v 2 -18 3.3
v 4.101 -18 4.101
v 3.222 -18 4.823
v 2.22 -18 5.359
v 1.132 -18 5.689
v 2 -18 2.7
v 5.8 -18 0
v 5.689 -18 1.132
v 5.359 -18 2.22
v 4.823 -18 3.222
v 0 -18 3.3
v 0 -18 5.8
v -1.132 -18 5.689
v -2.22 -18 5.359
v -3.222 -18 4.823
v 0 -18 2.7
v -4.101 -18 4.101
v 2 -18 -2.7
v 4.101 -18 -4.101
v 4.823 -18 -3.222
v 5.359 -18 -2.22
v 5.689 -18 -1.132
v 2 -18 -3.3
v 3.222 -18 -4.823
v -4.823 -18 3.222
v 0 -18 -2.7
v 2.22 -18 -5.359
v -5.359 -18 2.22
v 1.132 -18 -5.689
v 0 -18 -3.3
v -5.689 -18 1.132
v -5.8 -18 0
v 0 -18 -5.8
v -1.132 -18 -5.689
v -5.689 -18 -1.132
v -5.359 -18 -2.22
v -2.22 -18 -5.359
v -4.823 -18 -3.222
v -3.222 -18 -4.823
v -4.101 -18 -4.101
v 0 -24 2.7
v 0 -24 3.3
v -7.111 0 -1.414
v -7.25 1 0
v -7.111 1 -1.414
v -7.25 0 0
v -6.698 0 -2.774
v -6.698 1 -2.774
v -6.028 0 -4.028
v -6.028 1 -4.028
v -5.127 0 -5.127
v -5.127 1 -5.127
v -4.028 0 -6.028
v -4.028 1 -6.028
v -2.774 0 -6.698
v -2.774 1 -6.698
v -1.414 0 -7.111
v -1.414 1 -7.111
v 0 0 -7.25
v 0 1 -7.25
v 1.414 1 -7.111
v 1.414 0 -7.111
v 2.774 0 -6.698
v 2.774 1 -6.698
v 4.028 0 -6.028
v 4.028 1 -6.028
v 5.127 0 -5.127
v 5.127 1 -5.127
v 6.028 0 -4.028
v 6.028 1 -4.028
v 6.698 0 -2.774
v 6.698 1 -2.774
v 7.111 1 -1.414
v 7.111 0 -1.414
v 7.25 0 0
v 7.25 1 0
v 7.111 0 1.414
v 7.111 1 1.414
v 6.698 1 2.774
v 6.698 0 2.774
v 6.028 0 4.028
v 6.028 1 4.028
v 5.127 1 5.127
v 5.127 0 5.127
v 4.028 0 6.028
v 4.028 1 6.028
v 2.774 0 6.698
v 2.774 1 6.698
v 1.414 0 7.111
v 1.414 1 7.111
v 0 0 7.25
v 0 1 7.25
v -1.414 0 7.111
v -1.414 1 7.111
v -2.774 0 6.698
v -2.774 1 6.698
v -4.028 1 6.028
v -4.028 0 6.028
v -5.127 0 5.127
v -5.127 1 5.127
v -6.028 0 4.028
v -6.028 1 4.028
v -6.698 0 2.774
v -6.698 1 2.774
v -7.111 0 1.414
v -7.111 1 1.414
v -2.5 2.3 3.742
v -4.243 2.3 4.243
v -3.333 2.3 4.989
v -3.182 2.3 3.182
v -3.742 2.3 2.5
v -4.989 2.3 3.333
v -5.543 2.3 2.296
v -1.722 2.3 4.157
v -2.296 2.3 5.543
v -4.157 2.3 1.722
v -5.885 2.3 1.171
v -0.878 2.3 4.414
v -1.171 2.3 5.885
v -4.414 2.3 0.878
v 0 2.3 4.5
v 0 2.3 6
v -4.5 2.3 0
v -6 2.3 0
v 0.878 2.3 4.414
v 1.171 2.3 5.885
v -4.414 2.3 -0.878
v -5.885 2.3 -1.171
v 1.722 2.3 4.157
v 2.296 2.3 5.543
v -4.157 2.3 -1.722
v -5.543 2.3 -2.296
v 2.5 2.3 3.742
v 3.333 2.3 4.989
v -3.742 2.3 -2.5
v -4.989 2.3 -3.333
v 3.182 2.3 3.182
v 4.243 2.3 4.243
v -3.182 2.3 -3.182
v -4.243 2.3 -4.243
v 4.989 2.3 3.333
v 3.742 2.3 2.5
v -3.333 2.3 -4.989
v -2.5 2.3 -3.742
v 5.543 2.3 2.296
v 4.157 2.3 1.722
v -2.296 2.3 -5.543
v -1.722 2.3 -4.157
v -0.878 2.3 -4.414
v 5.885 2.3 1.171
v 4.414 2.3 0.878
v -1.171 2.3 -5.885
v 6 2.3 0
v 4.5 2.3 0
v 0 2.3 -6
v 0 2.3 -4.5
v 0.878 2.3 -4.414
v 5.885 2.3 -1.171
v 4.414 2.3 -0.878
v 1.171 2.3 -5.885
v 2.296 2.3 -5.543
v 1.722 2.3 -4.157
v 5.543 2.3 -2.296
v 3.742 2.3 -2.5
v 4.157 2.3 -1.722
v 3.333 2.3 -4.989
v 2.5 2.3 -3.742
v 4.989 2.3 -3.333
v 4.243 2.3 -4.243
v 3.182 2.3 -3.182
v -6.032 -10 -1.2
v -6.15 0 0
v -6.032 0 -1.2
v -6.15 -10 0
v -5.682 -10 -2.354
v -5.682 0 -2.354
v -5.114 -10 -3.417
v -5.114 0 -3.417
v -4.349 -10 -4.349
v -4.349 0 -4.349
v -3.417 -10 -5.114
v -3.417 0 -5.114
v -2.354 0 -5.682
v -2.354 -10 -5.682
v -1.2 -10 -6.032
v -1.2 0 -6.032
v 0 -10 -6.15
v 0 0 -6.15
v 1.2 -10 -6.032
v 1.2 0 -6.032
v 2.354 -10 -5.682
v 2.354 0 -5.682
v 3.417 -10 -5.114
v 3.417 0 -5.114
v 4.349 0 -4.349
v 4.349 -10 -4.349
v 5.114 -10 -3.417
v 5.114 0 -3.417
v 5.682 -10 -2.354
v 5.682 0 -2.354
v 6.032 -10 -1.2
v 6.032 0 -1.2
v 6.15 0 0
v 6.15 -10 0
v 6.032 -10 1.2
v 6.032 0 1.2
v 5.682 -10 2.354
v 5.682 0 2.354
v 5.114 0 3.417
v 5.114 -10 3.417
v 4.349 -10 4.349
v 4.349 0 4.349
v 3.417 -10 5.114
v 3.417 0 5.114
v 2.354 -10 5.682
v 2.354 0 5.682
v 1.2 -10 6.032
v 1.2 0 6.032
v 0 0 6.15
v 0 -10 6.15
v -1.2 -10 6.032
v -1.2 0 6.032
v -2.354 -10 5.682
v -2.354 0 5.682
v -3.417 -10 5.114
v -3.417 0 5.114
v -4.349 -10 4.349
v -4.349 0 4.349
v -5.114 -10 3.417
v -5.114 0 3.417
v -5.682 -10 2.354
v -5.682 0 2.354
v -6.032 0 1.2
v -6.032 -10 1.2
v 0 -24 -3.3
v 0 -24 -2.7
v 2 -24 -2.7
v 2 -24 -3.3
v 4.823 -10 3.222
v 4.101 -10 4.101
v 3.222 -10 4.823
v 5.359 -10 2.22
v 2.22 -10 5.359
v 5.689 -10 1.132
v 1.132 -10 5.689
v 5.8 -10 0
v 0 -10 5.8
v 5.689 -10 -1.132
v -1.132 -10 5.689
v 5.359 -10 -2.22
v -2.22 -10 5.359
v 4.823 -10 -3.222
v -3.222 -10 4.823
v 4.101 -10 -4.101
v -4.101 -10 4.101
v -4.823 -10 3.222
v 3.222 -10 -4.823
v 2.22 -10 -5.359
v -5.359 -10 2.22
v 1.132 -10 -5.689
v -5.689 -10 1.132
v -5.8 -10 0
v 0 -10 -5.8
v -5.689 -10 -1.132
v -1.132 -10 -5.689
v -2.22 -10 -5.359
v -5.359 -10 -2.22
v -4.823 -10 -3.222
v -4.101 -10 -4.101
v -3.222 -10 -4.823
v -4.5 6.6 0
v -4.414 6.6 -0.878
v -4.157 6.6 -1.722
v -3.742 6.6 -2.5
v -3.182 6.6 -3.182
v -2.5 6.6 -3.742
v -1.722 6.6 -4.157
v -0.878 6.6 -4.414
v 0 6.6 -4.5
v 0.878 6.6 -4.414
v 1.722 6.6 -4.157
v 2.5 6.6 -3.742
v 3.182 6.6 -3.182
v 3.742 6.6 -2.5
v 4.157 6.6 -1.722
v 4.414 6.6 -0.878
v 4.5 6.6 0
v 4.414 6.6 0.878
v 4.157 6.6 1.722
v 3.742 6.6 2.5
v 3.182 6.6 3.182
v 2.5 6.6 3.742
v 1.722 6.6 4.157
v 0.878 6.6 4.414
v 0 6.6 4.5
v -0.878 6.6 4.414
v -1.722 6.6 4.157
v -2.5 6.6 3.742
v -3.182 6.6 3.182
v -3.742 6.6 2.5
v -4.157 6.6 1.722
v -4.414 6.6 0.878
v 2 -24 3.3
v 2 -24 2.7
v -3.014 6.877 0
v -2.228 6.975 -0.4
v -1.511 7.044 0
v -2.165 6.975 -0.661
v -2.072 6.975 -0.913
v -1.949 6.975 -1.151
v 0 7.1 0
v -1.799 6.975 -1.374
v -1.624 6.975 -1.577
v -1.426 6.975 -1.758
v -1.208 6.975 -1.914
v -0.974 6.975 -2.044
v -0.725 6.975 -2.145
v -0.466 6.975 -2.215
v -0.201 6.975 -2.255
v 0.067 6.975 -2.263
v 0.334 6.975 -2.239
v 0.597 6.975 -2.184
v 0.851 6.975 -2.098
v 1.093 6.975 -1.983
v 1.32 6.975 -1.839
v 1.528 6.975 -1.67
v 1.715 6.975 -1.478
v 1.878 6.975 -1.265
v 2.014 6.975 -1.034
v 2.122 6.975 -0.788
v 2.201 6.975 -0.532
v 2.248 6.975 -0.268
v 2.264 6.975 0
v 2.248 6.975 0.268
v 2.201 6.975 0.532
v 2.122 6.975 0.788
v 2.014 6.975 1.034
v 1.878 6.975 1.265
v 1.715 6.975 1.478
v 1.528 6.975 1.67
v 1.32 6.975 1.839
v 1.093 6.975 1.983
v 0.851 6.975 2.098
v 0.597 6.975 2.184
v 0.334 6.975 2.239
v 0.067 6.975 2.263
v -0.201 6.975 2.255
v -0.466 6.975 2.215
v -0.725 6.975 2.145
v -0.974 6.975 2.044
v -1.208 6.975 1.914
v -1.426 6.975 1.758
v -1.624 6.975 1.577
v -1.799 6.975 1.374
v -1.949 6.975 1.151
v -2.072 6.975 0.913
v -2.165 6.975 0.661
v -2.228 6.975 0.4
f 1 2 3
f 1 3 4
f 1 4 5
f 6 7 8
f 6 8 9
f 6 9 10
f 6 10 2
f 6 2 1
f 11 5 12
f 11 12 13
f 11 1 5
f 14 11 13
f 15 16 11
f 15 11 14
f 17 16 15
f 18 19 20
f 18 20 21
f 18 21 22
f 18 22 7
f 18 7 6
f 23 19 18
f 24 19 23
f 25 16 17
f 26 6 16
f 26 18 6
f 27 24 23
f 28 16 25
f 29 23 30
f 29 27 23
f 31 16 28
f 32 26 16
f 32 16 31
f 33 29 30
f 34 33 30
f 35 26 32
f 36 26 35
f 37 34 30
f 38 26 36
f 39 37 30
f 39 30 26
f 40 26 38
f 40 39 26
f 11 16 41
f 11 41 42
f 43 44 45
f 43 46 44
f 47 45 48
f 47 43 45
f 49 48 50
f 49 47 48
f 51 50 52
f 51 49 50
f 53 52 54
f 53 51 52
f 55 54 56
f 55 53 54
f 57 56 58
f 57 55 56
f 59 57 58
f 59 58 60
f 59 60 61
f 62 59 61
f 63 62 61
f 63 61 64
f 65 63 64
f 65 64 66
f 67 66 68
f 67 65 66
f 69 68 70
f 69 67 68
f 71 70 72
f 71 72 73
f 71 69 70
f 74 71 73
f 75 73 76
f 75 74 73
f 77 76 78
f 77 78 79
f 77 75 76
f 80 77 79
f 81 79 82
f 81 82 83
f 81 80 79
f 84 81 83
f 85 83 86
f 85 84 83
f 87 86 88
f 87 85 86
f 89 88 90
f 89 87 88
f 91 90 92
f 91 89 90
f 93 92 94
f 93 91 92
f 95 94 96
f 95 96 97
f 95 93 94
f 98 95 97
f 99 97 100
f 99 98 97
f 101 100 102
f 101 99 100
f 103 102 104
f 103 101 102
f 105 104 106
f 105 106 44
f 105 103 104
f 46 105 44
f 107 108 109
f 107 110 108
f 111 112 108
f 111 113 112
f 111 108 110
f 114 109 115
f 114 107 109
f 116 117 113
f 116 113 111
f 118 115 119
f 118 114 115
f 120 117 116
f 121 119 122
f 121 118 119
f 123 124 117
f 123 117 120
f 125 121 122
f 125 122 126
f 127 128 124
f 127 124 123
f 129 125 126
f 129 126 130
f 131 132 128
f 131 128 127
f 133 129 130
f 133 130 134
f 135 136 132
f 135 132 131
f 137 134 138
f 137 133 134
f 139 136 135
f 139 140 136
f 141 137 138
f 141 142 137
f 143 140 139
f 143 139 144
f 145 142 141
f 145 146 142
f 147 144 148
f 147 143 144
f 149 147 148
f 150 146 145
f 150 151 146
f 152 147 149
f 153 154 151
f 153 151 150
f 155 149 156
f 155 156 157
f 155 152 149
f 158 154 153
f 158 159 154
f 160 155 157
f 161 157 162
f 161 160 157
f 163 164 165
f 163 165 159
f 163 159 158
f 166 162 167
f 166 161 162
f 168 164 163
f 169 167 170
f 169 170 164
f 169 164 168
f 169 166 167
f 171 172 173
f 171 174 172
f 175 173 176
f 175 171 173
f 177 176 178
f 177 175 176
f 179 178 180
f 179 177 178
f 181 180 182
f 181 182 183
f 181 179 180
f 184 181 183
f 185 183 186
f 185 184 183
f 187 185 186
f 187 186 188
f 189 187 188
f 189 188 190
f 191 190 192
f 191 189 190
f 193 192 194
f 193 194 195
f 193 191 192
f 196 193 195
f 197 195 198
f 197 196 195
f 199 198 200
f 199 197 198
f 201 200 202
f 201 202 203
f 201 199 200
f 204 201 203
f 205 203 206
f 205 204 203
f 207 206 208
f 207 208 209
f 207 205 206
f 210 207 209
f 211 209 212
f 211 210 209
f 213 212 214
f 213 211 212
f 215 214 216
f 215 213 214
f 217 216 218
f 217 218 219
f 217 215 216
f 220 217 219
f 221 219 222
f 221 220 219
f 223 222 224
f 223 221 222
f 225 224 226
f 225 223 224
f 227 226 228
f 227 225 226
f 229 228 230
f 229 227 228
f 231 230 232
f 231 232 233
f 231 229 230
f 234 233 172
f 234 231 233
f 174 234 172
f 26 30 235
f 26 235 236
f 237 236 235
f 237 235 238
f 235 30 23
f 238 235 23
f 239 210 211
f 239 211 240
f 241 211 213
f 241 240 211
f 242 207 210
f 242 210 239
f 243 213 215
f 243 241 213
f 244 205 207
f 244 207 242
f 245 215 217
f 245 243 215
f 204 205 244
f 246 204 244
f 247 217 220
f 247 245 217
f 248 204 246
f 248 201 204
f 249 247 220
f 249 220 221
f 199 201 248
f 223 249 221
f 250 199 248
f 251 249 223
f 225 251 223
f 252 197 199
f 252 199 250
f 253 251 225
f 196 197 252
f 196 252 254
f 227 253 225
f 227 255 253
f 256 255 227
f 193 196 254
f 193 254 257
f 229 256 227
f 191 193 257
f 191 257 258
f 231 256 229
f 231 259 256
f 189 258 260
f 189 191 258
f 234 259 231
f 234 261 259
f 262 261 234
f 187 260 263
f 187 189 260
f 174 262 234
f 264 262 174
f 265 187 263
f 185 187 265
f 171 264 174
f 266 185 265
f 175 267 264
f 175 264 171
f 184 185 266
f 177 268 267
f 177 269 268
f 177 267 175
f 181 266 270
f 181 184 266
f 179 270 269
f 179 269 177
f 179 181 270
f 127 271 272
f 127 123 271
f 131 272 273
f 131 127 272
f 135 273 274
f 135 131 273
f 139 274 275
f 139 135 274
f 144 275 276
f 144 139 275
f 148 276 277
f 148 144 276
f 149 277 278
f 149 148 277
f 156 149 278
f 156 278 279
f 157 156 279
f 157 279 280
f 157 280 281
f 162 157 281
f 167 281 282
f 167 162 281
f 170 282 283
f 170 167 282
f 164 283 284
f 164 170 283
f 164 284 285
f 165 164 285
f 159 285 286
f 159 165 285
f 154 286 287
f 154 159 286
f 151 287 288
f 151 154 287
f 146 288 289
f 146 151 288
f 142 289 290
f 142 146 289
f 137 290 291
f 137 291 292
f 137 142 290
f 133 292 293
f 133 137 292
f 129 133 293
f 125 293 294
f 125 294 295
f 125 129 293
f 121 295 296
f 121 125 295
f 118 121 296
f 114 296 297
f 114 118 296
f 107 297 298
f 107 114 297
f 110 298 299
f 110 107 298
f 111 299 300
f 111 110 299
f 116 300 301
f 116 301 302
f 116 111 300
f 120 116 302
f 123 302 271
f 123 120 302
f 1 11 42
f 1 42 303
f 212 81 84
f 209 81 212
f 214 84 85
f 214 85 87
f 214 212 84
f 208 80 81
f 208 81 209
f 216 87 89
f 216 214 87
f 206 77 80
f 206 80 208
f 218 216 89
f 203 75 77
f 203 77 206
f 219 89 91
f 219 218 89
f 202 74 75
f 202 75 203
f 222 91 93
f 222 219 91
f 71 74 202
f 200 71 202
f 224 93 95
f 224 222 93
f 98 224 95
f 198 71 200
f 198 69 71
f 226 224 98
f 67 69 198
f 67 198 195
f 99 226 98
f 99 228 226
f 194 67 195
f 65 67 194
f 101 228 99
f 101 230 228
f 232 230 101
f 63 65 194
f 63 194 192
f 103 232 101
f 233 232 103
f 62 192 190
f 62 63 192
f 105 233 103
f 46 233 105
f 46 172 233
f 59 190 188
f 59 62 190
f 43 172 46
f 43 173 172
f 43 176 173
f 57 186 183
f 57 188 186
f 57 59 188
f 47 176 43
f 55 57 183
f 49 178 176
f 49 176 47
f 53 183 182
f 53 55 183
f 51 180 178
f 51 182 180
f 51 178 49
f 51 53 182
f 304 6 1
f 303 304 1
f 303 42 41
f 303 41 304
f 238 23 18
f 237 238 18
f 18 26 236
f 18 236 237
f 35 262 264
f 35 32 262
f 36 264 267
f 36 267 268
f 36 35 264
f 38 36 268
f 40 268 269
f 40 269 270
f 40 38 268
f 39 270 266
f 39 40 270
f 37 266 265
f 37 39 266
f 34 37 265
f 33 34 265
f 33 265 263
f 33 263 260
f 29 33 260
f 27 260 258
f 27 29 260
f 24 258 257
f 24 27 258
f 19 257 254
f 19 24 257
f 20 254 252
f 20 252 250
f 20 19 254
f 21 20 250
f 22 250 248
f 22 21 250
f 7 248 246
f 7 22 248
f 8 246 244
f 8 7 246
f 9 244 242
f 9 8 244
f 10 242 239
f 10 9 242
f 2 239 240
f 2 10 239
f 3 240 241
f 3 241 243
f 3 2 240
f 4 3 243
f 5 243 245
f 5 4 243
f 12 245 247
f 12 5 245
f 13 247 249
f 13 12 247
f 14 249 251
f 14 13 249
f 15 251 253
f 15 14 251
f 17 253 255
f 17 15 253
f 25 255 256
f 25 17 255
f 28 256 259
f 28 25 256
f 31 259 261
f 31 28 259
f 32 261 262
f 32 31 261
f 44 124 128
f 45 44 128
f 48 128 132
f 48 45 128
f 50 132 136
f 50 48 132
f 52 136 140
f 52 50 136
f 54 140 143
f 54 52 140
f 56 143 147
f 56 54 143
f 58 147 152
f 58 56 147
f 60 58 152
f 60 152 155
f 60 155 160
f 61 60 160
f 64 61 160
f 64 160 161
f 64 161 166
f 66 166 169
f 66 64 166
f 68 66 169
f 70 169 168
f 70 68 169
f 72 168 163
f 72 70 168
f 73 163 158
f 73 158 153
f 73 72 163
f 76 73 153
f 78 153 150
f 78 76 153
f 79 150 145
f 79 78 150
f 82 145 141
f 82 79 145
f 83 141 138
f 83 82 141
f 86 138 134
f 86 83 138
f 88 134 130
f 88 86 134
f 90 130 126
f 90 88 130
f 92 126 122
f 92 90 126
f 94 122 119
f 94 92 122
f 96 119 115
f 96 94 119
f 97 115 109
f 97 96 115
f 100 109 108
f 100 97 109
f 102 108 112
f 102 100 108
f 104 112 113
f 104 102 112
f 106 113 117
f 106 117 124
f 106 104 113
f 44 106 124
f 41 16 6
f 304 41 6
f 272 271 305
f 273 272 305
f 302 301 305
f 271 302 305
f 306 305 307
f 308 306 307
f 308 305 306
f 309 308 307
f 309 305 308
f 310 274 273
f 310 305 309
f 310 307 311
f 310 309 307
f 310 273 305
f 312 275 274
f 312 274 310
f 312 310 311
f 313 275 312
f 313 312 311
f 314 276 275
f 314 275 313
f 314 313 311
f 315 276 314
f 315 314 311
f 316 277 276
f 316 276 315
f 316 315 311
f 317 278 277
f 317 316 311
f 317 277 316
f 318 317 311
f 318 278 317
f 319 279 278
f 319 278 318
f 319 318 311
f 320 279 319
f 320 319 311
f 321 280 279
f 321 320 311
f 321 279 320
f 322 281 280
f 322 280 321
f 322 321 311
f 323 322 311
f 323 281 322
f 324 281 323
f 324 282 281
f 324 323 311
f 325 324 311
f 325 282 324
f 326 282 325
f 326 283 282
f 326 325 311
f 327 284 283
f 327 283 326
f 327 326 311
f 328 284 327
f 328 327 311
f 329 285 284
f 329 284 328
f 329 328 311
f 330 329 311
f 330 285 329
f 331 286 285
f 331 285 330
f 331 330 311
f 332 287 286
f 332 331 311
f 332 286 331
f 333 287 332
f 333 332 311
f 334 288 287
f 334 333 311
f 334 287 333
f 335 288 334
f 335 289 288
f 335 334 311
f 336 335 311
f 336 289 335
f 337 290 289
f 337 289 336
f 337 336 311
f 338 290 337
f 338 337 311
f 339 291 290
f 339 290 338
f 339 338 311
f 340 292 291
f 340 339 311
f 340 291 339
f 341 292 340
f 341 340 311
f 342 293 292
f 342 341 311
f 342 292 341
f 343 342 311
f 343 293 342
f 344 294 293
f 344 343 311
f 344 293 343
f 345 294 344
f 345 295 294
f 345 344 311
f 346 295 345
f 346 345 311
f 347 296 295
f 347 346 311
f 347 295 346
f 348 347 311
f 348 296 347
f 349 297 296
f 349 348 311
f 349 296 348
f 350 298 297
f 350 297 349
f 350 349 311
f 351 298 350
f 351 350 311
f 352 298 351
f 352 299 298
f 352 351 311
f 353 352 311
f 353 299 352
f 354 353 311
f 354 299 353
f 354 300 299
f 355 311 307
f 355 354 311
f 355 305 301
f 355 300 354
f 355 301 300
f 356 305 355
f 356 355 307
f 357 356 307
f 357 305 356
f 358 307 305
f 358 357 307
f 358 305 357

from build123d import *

# Parameters (mm, degrees)
SKETCH2_W           = 2
SKETCH2_H           = 0.6
BOSS_EXTRUDE1_DEPTH = 6


with BuildPart() as part:
    # Sketch1 → Revolve1 (revolve)
    with BuildSketch(Plane.XY):
        with BuildLine():
            Line((-4.5, 6.6), (-4.5, 2.3))
            Line((-4.5, 2.3), (-6, 2.3))
            Line((-6, 2.3), (-7.25, 1))
            Line((-7.25, 1), (-7.25, 0))
            Line((-7.25, 0), (-6.15, 0))
            Line((-6.15, 0), (-6.15, -10))
            Line((-6.15, -10), (-5.8, -10))
            Line((-5.8, -10), (-5.8, -18))
            Line((-5.8, -18), (0, -18))
            Line((0, -18), (0, 7.1))
            ThreePointArc((0, 7.1), (-2.263846285, 6.974616561), (-4.5, 6.6))
        make_face()
    revolve(axis=Axis((0, 17.963306775, 0), (0, -1, 0)))

    # Sketch2 → Boss-Extrude1 (add)
    with BuildSketch(Plane.XZ.offset(18)):
        with Locations((1, 3)):
            Rectangle(SKETCH2_W, SKETCH2_H)
        with Locations((1, -3)):
            Rectangle(SKETCH2_W, SKETCH2_H)
    extrude(amount=BOSS_EXTRUDE1_DEPTH)


solid = part.part
